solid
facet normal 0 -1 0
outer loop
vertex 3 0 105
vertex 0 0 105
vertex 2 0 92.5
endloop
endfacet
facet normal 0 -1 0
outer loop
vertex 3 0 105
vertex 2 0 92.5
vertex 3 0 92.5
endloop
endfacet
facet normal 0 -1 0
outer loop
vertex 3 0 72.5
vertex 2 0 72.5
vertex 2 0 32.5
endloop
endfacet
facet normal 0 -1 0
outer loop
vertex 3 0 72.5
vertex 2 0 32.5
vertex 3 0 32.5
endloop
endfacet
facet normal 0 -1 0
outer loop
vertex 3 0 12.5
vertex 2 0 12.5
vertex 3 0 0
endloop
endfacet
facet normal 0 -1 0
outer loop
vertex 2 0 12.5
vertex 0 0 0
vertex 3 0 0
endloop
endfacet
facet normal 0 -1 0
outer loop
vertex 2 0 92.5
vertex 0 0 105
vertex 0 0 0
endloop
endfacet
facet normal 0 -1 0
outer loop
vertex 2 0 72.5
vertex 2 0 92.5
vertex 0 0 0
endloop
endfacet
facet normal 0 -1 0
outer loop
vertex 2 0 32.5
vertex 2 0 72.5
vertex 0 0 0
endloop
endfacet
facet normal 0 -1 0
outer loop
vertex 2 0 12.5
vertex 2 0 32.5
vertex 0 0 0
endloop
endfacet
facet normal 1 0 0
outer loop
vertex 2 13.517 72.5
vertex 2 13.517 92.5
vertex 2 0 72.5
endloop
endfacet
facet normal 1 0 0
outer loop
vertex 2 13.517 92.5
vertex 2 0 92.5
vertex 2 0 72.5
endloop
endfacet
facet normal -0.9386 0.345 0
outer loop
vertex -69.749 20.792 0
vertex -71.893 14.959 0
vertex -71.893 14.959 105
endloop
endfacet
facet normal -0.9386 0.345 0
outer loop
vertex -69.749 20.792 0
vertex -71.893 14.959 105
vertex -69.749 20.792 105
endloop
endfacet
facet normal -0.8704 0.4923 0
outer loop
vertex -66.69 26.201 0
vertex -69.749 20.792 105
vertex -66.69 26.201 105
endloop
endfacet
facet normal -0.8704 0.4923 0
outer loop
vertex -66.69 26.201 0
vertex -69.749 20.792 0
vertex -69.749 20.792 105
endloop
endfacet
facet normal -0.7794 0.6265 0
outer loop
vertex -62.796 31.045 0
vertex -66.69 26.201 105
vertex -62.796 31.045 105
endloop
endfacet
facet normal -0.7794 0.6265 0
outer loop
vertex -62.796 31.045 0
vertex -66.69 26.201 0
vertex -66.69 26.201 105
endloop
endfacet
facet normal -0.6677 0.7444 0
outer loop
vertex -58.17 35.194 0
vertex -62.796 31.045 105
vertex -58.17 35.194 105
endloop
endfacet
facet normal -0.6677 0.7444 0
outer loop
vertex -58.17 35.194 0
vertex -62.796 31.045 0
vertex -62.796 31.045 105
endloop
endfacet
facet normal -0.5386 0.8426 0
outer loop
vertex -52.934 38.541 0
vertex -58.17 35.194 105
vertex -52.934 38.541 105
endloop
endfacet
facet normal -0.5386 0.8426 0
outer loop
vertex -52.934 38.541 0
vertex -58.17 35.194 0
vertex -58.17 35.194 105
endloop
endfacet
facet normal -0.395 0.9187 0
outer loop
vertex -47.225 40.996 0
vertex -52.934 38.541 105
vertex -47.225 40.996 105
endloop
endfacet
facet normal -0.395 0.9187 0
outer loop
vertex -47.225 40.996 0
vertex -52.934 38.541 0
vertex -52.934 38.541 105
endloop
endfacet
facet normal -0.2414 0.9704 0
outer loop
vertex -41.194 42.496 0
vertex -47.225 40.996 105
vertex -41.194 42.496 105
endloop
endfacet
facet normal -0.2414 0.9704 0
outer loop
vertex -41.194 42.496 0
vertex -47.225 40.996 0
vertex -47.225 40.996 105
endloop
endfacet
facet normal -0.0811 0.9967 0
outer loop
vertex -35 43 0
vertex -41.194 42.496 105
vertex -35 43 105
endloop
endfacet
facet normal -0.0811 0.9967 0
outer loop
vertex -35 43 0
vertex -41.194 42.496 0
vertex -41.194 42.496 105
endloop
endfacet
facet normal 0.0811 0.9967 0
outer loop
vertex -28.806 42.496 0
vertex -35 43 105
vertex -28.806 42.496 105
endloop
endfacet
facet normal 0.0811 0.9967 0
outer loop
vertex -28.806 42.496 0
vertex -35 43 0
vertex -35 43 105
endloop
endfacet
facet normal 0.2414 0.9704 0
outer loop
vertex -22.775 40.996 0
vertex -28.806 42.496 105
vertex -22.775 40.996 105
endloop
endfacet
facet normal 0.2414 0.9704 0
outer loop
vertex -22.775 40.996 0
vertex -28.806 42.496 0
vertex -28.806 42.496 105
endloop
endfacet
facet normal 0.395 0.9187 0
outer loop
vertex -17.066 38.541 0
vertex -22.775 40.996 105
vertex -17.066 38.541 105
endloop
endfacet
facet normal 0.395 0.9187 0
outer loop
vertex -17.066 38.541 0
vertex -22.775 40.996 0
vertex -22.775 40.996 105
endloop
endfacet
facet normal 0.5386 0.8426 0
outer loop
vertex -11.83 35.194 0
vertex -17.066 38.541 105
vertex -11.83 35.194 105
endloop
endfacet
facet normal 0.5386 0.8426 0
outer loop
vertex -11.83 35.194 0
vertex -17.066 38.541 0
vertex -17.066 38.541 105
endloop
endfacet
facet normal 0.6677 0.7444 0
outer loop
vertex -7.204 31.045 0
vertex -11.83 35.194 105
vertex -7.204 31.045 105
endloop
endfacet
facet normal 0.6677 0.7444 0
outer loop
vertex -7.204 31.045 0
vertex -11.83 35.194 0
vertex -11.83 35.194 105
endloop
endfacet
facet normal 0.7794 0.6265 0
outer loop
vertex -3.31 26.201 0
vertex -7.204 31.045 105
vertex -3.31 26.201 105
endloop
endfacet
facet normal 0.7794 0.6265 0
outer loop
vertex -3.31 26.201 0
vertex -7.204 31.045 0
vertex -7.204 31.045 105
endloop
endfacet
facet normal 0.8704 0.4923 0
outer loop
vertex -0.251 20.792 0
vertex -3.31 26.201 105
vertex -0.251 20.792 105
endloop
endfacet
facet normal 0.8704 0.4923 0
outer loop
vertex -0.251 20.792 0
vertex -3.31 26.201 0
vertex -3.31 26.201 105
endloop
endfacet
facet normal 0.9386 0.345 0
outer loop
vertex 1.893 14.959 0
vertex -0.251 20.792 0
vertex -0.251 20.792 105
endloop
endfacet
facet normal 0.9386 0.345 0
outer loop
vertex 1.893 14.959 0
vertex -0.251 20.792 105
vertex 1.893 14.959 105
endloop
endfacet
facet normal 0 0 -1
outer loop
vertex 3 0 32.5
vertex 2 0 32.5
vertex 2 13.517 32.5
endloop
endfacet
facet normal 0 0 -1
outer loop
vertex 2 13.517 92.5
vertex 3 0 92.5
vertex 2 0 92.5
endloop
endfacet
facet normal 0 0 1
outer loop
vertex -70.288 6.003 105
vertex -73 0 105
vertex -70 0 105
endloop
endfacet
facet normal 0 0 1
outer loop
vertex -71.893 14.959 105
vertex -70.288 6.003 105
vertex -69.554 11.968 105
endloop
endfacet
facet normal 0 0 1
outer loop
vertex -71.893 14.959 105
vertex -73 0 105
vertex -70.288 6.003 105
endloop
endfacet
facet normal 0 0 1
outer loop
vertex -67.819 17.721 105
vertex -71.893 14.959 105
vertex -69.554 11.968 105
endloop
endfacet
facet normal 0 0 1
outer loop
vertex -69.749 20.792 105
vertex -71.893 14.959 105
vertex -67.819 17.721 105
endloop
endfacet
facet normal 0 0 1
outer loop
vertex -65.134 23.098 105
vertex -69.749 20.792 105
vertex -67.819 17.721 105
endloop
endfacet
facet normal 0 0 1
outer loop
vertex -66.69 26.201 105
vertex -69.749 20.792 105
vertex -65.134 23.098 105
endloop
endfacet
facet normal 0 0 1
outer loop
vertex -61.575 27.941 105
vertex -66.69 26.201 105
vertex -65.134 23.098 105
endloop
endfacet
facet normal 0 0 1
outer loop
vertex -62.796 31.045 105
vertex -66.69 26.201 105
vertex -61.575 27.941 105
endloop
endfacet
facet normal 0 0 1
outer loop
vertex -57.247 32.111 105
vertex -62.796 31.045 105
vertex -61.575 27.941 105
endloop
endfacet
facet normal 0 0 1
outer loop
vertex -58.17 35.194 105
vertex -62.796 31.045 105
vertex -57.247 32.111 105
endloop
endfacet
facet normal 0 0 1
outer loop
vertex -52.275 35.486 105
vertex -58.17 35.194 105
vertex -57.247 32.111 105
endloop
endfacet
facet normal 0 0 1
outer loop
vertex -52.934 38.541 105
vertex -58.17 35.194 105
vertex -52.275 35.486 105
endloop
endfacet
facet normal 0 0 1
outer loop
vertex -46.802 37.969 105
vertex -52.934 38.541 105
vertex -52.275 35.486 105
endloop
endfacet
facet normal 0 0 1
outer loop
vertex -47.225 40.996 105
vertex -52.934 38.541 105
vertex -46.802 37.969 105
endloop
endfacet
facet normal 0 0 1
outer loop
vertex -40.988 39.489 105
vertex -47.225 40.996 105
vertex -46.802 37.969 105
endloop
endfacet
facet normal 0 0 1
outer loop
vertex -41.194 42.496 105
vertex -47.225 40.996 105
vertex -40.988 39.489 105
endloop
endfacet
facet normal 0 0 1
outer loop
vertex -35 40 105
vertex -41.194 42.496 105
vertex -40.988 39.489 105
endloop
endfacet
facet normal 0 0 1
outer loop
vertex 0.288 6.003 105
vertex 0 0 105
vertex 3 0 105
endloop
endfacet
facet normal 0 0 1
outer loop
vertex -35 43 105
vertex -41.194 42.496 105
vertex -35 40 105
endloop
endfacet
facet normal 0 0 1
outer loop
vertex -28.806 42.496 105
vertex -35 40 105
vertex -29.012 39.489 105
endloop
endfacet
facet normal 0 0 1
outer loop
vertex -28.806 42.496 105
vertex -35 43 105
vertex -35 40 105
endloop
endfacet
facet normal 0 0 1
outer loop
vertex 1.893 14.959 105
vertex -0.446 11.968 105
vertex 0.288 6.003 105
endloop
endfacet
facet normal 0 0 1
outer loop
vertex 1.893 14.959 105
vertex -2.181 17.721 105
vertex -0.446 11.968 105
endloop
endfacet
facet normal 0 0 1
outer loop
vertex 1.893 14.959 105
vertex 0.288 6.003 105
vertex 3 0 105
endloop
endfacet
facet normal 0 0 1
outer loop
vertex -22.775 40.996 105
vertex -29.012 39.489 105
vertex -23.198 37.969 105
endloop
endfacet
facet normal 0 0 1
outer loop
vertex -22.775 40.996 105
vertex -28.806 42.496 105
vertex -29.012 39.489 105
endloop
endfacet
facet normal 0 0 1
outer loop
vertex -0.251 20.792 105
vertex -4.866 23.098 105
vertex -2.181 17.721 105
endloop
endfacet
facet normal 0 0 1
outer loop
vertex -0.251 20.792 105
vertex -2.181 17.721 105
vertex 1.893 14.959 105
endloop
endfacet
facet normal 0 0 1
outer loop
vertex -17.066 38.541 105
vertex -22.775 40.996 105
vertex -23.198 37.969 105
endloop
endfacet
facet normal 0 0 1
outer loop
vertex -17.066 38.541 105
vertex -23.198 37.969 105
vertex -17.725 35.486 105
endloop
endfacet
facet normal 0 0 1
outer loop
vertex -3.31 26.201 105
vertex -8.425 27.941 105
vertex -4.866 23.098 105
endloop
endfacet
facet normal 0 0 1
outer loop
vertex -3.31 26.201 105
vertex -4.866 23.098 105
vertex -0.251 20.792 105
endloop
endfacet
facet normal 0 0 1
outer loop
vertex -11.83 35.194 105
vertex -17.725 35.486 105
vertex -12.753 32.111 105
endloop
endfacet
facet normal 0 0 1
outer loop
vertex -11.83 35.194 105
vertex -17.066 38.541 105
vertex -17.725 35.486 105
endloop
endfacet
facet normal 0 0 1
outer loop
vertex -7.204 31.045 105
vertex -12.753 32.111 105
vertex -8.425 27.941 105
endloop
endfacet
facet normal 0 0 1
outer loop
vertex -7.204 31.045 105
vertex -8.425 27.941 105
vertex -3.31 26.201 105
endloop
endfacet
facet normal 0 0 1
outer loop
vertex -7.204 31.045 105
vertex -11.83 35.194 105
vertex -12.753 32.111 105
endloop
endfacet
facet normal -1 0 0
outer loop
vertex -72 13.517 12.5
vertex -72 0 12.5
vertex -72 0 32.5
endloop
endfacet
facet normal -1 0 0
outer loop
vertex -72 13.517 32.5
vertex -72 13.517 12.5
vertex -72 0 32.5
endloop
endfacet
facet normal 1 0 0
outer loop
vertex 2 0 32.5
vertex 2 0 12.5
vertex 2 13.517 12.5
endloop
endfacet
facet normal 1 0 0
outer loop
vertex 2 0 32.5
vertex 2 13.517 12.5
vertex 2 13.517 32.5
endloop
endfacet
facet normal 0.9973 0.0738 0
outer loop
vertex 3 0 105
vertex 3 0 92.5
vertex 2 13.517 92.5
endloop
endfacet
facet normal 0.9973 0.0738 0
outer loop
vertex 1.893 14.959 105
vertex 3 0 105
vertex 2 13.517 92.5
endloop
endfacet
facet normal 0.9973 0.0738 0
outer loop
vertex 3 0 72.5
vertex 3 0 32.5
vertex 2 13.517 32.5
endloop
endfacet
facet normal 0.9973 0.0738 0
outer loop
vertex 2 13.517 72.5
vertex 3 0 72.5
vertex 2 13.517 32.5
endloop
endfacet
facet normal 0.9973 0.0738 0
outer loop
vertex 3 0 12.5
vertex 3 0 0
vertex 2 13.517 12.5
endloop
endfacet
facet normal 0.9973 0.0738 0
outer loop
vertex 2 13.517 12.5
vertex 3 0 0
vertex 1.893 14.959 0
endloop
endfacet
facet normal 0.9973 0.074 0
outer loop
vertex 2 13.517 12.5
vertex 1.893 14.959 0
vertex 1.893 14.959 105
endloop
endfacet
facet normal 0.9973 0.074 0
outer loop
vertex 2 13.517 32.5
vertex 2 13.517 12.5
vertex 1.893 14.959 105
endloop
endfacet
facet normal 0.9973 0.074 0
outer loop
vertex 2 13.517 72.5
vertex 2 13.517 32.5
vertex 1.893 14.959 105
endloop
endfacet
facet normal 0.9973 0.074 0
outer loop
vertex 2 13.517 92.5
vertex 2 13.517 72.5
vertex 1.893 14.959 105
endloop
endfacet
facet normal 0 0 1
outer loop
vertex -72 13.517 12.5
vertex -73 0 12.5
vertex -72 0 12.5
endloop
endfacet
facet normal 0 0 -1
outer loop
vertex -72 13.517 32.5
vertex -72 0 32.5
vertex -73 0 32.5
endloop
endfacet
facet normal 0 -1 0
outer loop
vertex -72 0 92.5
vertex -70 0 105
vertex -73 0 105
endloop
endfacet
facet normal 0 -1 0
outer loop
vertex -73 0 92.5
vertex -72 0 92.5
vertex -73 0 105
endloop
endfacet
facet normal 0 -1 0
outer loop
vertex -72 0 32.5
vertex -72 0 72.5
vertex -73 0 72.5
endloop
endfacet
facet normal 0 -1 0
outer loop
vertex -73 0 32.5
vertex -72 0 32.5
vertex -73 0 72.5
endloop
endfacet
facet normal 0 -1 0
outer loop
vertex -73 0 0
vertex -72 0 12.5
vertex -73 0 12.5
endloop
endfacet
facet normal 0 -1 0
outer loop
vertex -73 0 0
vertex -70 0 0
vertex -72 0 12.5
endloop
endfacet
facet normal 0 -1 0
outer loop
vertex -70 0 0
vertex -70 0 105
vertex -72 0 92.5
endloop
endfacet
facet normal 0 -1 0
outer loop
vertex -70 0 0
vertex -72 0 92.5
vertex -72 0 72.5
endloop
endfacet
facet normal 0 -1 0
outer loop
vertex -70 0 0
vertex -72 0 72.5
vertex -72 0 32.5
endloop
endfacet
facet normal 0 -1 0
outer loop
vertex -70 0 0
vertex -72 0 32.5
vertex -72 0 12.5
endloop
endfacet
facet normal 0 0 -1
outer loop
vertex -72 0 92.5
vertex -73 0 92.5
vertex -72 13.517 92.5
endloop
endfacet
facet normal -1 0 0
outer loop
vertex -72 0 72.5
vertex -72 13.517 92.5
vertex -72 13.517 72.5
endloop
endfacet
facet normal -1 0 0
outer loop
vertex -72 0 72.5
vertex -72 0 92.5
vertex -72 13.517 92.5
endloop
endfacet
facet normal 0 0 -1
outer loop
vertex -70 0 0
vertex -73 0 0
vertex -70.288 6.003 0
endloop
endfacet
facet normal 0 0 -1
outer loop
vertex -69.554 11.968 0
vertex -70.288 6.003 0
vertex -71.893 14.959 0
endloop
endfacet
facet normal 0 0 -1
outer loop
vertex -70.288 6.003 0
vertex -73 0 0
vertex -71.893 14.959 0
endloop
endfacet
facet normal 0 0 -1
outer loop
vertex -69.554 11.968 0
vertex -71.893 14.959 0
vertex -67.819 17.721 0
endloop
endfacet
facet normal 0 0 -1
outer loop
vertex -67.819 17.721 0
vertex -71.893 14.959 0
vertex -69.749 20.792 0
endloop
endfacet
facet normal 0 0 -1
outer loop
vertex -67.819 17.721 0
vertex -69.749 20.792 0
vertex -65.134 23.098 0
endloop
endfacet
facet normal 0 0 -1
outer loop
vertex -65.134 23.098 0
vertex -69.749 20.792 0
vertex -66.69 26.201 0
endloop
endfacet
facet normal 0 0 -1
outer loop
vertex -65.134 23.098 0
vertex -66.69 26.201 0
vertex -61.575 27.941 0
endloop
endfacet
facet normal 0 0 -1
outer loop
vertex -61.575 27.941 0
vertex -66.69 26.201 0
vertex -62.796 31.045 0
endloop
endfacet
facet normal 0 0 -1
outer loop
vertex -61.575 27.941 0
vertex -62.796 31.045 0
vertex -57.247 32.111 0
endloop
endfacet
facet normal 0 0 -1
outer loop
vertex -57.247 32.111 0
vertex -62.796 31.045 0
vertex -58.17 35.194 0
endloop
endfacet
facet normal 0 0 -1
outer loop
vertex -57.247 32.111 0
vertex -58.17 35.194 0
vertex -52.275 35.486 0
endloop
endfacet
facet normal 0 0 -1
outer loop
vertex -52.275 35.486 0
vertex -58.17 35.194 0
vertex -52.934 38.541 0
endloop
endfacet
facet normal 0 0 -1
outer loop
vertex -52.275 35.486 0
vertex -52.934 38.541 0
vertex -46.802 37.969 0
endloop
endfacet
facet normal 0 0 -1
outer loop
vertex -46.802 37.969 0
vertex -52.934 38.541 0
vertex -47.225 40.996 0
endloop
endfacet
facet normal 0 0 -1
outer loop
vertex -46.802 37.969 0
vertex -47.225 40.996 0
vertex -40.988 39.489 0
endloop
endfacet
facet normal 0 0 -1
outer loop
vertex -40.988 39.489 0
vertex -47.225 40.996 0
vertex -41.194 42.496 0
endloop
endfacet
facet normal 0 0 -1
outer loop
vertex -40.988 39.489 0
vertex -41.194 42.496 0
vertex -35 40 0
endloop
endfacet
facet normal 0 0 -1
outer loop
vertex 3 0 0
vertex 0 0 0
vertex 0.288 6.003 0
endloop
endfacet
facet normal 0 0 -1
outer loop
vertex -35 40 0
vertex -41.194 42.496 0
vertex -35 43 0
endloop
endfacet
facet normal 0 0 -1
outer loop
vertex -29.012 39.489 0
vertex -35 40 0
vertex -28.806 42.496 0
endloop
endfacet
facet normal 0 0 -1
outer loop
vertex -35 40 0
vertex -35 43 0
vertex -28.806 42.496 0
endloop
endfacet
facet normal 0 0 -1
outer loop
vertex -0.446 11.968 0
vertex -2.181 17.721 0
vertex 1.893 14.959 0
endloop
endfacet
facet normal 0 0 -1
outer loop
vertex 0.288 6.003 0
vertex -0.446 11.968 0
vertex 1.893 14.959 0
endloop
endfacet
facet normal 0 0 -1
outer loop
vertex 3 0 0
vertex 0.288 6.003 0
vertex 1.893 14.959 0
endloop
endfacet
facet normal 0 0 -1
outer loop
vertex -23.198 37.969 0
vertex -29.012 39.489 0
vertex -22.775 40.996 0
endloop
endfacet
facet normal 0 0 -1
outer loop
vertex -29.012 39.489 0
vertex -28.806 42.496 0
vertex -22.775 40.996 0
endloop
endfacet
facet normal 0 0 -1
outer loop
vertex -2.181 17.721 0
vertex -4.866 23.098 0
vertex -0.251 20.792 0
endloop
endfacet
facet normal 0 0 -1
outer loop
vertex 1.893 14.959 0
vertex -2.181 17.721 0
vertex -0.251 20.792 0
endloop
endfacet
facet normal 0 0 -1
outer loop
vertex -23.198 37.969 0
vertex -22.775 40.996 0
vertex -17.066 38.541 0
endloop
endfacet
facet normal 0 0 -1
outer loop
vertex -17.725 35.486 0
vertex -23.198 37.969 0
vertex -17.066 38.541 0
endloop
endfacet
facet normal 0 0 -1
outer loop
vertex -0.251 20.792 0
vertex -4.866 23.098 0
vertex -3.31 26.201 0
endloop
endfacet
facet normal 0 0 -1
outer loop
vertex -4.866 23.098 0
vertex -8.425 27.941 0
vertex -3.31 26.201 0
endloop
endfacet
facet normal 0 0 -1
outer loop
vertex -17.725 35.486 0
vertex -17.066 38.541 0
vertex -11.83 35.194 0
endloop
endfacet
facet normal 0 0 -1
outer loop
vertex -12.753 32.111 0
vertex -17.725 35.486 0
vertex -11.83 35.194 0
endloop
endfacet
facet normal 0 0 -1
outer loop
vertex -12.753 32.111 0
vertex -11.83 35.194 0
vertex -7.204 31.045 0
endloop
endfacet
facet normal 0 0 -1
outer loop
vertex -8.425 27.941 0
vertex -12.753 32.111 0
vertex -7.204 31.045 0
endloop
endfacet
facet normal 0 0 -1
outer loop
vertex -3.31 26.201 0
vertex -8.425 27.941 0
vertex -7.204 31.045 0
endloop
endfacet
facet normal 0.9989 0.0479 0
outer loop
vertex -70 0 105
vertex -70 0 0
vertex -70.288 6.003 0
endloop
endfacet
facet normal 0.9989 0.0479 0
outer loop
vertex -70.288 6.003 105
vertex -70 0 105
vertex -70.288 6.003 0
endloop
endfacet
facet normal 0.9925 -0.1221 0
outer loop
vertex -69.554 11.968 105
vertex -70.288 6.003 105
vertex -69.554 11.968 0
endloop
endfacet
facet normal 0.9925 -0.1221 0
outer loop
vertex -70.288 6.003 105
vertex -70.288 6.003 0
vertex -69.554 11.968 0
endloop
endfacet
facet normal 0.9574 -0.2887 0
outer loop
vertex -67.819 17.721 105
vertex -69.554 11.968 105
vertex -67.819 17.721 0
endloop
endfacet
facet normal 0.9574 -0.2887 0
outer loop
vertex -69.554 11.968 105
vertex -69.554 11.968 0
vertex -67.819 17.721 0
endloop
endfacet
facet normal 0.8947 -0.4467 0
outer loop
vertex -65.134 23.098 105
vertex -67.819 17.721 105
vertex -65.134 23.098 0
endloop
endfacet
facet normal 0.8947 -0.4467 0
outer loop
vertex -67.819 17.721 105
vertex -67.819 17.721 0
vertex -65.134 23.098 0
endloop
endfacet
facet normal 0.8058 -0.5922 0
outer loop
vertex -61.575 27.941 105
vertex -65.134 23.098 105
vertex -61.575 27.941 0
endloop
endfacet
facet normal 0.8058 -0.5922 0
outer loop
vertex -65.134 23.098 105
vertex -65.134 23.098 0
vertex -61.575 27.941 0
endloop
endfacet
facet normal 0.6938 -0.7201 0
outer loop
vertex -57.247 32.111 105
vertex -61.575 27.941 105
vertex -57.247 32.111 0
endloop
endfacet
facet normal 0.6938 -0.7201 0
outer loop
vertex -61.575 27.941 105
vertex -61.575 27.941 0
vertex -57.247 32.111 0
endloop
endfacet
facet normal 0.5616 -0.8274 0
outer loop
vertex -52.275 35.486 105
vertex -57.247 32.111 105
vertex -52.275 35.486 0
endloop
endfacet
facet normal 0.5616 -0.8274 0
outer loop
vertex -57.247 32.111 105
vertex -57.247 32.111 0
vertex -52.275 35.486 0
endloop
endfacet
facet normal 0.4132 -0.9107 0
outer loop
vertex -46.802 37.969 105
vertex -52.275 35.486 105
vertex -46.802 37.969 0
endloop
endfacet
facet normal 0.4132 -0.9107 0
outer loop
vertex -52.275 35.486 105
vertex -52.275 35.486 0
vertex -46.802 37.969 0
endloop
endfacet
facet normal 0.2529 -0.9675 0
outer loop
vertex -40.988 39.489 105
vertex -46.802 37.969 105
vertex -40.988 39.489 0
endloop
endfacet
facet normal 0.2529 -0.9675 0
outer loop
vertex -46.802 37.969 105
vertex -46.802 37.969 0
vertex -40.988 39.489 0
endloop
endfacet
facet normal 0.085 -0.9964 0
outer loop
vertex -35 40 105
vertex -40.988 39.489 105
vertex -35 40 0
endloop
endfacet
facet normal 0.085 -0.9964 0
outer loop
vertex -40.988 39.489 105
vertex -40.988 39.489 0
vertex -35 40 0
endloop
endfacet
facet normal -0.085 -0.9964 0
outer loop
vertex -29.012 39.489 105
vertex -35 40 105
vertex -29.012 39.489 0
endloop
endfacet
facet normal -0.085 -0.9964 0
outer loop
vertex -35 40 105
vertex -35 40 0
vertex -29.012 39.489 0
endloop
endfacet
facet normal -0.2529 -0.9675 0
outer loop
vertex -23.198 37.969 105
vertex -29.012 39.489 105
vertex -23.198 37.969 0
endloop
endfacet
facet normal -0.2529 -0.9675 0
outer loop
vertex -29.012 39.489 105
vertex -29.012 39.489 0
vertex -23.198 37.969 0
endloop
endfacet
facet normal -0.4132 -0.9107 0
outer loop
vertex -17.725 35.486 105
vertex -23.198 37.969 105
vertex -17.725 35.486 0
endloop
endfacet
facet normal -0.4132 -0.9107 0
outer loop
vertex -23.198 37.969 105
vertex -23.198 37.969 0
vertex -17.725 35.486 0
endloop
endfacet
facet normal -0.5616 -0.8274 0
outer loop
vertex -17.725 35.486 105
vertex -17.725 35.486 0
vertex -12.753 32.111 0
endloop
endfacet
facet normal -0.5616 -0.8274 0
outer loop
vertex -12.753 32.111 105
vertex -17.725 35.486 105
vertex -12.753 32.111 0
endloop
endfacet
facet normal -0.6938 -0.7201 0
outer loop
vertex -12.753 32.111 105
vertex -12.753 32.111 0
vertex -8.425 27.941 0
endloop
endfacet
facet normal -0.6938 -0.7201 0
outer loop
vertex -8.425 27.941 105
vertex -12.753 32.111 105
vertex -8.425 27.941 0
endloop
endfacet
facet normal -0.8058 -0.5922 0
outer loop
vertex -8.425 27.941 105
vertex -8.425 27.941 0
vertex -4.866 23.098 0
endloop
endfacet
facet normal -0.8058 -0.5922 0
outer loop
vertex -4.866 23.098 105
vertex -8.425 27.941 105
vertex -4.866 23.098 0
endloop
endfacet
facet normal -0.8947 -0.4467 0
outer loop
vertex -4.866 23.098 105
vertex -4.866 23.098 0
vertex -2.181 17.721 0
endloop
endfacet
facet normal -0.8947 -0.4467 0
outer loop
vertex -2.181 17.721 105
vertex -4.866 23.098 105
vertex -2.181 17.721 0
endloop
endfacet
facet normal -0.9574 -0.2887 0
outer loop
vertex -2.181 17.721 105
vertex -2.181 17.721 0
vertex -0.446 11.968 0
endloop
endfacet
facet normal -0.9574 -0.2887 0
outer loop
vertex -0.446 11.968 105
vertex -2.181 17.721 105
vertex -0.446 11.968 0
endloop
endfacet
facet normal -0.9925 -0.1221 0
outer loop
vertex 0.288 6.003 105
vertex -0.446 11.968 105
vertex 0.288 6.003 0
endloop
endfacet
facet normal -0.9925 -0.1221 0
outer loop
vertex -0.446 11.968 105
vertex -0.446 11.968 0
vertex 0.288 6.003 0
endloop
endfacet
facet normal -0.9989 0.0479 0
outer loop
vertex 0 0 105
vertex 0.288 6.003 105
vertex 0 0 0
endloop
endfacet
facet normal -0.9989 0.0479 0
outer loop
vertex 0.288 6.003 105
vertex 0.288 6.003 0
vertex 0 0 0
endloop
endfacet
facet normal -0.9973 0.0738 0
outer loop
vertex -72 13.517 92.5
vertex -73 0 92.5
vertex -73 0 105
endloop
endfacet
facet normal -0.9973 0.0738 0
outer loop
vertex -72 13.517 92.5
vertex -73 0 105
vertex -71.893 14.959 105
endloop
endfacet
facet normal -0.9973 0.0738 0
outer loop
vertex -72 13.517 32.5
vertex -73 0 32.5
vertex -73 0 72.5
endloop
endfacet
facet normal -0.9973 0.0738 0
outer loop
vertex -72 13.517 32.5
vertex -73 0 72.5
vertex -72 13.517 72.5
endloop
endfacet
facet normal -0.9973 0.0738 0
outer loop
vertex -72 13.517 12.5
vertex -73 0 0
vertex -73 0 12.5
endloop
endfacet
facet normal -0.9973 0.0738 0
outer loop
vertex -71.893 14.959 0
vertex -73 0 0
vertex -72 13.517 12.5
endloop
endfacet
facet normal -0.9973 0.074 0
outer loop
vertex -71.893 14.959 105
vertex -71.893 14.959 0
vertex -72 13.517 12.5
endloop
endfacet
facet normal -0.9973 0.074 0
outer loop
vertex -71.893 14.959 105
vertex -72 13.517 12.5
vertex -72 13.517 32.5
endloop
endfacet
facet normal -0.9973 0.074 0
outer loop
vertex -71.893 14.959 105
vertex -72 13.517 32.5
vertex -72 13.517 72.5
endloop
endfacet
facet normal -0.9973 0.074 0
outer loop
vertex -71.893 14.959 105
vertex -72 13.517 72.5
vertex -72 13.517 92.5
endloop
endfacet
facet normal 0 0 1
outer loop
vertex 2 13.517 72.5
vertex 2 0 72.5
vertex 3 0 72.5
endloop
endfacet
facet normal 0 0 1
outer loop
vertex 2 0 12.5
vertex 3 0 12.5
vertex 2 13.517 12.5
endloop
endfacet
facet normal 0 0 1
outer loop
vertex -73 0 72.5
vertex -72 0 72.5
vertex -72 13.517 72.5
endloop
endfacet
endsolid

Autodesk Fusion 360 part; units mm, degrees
sketch "Sketch1" plane through (0, 0, 0) normal (0, 0, 1) x (1, 0, 0)
  line L0 (0, 0) -> (-70, 0)
  line L1 (-35, 0) -> (-35, 40)
  arc A0 (0, 0) -> (-70, 0) centre (-35, 4.6875) ccw
  line L2 (-70, 0) -> (-73, 0)
  line L3 (0, 0) -> (3, 0)
  line L4 (-35, 40) -> (-35, 43)
  arc A1 (3, 0) -> (-73, 0) centre (-35, 4.7093) ccw
  line L5 (-73, 0) -> (-71.8933, 14.9591)
  line L6 (3, 0) -> (1.8933, 14.9591)
  dimension "d1" = 70
  dimension "d2" = 40
  dimension "d3" = 3
  dimension "d4" = 3
  dimension "d5" = 3
  dimension "d6" = 15
  dimension "d7" = 15
extrude "Extrude1" add sketch "Sketch1" along normal blind 105 contours A0 L3 L4 A1 L6 | A0 L2 L4 A1 L5
sketch "Sketch4" plane through (0, 0, 0) normal (0, -1, 0) x (1, 0, 0)
  line L0 (-73, 0) -> (-70, 0)
  line L1 (-70, 0) -> (-70, 105)
  line L2 (-70, 105) -> (-73, 105)
  line L3 (-73, 105) -> (-73, 0)
  line L4 (-73, 105) -> (3, 105)
  line L5 (3, 105) -> (3, 0)
  line L6 (3, 0) -> (-73, 0)
  line L7 (-73, 0) -> (-73, 105)
  line L8 (-73, 52.5) -> (-73, 72.5)
  line L9 (-73, 72.5) -> (-73, 92.5)
  line L10 (-73, 92.5) -> (-72, 92.5)
  line L11 (-72, 92.5) -> (-72, 72.5)
  line L12 (-72, 72.5) -> (-73, 72.5)
  line L13 (-73, 72.5) -> (-73, 92.5)
  line L14 (-73, 52.5) -> (3, 52.5) construction
  line L15 (-35, 52.5) -> (-35, 93.5456) construction
  line L16 (-73, 32.5) -> (-73, 12.5)
  line L17 (-72, 12.5) -> (-72, 32.5)
  line L18 (-73, 12.5) -> (-72, 12.5)
  line L19 (-72, 32.5) -> (-73, 32.5)
  line L20 (3, 92.5) -> (2, 92.5)
  line L21 (2, 72.5) -> (3, 72.5)
  line L22 (3, 72.5) -> (3, 92.5)
  line L23 (2, 92.5) -> (2, 72.5)
  line L24 (3, 72.5) -> (3, 92.5)
  line L25 (2, 32.5) -> (3, 32.5)
  line L26 (3, 32.5) -> (3, 12.5)
  line L27 (2, 12.5) -> (2, 32.5)
  line L28 (3, 12.5) -> (2, 12.5)
  dimension "d31" = 20
  dimension "d32" = 20
  dimension "d33" = 1
  dimension "d34" = 76
extrude "Extrude6" cut sketch "Sketch4" against normal blind 20 contours L3 L7 L16 L17 L18 L19 | L5 L25 L26 L27 L28 | L3 L7 L9 L10 L11 L12 L13 | L5 L20 L21 L22 L23 L24
